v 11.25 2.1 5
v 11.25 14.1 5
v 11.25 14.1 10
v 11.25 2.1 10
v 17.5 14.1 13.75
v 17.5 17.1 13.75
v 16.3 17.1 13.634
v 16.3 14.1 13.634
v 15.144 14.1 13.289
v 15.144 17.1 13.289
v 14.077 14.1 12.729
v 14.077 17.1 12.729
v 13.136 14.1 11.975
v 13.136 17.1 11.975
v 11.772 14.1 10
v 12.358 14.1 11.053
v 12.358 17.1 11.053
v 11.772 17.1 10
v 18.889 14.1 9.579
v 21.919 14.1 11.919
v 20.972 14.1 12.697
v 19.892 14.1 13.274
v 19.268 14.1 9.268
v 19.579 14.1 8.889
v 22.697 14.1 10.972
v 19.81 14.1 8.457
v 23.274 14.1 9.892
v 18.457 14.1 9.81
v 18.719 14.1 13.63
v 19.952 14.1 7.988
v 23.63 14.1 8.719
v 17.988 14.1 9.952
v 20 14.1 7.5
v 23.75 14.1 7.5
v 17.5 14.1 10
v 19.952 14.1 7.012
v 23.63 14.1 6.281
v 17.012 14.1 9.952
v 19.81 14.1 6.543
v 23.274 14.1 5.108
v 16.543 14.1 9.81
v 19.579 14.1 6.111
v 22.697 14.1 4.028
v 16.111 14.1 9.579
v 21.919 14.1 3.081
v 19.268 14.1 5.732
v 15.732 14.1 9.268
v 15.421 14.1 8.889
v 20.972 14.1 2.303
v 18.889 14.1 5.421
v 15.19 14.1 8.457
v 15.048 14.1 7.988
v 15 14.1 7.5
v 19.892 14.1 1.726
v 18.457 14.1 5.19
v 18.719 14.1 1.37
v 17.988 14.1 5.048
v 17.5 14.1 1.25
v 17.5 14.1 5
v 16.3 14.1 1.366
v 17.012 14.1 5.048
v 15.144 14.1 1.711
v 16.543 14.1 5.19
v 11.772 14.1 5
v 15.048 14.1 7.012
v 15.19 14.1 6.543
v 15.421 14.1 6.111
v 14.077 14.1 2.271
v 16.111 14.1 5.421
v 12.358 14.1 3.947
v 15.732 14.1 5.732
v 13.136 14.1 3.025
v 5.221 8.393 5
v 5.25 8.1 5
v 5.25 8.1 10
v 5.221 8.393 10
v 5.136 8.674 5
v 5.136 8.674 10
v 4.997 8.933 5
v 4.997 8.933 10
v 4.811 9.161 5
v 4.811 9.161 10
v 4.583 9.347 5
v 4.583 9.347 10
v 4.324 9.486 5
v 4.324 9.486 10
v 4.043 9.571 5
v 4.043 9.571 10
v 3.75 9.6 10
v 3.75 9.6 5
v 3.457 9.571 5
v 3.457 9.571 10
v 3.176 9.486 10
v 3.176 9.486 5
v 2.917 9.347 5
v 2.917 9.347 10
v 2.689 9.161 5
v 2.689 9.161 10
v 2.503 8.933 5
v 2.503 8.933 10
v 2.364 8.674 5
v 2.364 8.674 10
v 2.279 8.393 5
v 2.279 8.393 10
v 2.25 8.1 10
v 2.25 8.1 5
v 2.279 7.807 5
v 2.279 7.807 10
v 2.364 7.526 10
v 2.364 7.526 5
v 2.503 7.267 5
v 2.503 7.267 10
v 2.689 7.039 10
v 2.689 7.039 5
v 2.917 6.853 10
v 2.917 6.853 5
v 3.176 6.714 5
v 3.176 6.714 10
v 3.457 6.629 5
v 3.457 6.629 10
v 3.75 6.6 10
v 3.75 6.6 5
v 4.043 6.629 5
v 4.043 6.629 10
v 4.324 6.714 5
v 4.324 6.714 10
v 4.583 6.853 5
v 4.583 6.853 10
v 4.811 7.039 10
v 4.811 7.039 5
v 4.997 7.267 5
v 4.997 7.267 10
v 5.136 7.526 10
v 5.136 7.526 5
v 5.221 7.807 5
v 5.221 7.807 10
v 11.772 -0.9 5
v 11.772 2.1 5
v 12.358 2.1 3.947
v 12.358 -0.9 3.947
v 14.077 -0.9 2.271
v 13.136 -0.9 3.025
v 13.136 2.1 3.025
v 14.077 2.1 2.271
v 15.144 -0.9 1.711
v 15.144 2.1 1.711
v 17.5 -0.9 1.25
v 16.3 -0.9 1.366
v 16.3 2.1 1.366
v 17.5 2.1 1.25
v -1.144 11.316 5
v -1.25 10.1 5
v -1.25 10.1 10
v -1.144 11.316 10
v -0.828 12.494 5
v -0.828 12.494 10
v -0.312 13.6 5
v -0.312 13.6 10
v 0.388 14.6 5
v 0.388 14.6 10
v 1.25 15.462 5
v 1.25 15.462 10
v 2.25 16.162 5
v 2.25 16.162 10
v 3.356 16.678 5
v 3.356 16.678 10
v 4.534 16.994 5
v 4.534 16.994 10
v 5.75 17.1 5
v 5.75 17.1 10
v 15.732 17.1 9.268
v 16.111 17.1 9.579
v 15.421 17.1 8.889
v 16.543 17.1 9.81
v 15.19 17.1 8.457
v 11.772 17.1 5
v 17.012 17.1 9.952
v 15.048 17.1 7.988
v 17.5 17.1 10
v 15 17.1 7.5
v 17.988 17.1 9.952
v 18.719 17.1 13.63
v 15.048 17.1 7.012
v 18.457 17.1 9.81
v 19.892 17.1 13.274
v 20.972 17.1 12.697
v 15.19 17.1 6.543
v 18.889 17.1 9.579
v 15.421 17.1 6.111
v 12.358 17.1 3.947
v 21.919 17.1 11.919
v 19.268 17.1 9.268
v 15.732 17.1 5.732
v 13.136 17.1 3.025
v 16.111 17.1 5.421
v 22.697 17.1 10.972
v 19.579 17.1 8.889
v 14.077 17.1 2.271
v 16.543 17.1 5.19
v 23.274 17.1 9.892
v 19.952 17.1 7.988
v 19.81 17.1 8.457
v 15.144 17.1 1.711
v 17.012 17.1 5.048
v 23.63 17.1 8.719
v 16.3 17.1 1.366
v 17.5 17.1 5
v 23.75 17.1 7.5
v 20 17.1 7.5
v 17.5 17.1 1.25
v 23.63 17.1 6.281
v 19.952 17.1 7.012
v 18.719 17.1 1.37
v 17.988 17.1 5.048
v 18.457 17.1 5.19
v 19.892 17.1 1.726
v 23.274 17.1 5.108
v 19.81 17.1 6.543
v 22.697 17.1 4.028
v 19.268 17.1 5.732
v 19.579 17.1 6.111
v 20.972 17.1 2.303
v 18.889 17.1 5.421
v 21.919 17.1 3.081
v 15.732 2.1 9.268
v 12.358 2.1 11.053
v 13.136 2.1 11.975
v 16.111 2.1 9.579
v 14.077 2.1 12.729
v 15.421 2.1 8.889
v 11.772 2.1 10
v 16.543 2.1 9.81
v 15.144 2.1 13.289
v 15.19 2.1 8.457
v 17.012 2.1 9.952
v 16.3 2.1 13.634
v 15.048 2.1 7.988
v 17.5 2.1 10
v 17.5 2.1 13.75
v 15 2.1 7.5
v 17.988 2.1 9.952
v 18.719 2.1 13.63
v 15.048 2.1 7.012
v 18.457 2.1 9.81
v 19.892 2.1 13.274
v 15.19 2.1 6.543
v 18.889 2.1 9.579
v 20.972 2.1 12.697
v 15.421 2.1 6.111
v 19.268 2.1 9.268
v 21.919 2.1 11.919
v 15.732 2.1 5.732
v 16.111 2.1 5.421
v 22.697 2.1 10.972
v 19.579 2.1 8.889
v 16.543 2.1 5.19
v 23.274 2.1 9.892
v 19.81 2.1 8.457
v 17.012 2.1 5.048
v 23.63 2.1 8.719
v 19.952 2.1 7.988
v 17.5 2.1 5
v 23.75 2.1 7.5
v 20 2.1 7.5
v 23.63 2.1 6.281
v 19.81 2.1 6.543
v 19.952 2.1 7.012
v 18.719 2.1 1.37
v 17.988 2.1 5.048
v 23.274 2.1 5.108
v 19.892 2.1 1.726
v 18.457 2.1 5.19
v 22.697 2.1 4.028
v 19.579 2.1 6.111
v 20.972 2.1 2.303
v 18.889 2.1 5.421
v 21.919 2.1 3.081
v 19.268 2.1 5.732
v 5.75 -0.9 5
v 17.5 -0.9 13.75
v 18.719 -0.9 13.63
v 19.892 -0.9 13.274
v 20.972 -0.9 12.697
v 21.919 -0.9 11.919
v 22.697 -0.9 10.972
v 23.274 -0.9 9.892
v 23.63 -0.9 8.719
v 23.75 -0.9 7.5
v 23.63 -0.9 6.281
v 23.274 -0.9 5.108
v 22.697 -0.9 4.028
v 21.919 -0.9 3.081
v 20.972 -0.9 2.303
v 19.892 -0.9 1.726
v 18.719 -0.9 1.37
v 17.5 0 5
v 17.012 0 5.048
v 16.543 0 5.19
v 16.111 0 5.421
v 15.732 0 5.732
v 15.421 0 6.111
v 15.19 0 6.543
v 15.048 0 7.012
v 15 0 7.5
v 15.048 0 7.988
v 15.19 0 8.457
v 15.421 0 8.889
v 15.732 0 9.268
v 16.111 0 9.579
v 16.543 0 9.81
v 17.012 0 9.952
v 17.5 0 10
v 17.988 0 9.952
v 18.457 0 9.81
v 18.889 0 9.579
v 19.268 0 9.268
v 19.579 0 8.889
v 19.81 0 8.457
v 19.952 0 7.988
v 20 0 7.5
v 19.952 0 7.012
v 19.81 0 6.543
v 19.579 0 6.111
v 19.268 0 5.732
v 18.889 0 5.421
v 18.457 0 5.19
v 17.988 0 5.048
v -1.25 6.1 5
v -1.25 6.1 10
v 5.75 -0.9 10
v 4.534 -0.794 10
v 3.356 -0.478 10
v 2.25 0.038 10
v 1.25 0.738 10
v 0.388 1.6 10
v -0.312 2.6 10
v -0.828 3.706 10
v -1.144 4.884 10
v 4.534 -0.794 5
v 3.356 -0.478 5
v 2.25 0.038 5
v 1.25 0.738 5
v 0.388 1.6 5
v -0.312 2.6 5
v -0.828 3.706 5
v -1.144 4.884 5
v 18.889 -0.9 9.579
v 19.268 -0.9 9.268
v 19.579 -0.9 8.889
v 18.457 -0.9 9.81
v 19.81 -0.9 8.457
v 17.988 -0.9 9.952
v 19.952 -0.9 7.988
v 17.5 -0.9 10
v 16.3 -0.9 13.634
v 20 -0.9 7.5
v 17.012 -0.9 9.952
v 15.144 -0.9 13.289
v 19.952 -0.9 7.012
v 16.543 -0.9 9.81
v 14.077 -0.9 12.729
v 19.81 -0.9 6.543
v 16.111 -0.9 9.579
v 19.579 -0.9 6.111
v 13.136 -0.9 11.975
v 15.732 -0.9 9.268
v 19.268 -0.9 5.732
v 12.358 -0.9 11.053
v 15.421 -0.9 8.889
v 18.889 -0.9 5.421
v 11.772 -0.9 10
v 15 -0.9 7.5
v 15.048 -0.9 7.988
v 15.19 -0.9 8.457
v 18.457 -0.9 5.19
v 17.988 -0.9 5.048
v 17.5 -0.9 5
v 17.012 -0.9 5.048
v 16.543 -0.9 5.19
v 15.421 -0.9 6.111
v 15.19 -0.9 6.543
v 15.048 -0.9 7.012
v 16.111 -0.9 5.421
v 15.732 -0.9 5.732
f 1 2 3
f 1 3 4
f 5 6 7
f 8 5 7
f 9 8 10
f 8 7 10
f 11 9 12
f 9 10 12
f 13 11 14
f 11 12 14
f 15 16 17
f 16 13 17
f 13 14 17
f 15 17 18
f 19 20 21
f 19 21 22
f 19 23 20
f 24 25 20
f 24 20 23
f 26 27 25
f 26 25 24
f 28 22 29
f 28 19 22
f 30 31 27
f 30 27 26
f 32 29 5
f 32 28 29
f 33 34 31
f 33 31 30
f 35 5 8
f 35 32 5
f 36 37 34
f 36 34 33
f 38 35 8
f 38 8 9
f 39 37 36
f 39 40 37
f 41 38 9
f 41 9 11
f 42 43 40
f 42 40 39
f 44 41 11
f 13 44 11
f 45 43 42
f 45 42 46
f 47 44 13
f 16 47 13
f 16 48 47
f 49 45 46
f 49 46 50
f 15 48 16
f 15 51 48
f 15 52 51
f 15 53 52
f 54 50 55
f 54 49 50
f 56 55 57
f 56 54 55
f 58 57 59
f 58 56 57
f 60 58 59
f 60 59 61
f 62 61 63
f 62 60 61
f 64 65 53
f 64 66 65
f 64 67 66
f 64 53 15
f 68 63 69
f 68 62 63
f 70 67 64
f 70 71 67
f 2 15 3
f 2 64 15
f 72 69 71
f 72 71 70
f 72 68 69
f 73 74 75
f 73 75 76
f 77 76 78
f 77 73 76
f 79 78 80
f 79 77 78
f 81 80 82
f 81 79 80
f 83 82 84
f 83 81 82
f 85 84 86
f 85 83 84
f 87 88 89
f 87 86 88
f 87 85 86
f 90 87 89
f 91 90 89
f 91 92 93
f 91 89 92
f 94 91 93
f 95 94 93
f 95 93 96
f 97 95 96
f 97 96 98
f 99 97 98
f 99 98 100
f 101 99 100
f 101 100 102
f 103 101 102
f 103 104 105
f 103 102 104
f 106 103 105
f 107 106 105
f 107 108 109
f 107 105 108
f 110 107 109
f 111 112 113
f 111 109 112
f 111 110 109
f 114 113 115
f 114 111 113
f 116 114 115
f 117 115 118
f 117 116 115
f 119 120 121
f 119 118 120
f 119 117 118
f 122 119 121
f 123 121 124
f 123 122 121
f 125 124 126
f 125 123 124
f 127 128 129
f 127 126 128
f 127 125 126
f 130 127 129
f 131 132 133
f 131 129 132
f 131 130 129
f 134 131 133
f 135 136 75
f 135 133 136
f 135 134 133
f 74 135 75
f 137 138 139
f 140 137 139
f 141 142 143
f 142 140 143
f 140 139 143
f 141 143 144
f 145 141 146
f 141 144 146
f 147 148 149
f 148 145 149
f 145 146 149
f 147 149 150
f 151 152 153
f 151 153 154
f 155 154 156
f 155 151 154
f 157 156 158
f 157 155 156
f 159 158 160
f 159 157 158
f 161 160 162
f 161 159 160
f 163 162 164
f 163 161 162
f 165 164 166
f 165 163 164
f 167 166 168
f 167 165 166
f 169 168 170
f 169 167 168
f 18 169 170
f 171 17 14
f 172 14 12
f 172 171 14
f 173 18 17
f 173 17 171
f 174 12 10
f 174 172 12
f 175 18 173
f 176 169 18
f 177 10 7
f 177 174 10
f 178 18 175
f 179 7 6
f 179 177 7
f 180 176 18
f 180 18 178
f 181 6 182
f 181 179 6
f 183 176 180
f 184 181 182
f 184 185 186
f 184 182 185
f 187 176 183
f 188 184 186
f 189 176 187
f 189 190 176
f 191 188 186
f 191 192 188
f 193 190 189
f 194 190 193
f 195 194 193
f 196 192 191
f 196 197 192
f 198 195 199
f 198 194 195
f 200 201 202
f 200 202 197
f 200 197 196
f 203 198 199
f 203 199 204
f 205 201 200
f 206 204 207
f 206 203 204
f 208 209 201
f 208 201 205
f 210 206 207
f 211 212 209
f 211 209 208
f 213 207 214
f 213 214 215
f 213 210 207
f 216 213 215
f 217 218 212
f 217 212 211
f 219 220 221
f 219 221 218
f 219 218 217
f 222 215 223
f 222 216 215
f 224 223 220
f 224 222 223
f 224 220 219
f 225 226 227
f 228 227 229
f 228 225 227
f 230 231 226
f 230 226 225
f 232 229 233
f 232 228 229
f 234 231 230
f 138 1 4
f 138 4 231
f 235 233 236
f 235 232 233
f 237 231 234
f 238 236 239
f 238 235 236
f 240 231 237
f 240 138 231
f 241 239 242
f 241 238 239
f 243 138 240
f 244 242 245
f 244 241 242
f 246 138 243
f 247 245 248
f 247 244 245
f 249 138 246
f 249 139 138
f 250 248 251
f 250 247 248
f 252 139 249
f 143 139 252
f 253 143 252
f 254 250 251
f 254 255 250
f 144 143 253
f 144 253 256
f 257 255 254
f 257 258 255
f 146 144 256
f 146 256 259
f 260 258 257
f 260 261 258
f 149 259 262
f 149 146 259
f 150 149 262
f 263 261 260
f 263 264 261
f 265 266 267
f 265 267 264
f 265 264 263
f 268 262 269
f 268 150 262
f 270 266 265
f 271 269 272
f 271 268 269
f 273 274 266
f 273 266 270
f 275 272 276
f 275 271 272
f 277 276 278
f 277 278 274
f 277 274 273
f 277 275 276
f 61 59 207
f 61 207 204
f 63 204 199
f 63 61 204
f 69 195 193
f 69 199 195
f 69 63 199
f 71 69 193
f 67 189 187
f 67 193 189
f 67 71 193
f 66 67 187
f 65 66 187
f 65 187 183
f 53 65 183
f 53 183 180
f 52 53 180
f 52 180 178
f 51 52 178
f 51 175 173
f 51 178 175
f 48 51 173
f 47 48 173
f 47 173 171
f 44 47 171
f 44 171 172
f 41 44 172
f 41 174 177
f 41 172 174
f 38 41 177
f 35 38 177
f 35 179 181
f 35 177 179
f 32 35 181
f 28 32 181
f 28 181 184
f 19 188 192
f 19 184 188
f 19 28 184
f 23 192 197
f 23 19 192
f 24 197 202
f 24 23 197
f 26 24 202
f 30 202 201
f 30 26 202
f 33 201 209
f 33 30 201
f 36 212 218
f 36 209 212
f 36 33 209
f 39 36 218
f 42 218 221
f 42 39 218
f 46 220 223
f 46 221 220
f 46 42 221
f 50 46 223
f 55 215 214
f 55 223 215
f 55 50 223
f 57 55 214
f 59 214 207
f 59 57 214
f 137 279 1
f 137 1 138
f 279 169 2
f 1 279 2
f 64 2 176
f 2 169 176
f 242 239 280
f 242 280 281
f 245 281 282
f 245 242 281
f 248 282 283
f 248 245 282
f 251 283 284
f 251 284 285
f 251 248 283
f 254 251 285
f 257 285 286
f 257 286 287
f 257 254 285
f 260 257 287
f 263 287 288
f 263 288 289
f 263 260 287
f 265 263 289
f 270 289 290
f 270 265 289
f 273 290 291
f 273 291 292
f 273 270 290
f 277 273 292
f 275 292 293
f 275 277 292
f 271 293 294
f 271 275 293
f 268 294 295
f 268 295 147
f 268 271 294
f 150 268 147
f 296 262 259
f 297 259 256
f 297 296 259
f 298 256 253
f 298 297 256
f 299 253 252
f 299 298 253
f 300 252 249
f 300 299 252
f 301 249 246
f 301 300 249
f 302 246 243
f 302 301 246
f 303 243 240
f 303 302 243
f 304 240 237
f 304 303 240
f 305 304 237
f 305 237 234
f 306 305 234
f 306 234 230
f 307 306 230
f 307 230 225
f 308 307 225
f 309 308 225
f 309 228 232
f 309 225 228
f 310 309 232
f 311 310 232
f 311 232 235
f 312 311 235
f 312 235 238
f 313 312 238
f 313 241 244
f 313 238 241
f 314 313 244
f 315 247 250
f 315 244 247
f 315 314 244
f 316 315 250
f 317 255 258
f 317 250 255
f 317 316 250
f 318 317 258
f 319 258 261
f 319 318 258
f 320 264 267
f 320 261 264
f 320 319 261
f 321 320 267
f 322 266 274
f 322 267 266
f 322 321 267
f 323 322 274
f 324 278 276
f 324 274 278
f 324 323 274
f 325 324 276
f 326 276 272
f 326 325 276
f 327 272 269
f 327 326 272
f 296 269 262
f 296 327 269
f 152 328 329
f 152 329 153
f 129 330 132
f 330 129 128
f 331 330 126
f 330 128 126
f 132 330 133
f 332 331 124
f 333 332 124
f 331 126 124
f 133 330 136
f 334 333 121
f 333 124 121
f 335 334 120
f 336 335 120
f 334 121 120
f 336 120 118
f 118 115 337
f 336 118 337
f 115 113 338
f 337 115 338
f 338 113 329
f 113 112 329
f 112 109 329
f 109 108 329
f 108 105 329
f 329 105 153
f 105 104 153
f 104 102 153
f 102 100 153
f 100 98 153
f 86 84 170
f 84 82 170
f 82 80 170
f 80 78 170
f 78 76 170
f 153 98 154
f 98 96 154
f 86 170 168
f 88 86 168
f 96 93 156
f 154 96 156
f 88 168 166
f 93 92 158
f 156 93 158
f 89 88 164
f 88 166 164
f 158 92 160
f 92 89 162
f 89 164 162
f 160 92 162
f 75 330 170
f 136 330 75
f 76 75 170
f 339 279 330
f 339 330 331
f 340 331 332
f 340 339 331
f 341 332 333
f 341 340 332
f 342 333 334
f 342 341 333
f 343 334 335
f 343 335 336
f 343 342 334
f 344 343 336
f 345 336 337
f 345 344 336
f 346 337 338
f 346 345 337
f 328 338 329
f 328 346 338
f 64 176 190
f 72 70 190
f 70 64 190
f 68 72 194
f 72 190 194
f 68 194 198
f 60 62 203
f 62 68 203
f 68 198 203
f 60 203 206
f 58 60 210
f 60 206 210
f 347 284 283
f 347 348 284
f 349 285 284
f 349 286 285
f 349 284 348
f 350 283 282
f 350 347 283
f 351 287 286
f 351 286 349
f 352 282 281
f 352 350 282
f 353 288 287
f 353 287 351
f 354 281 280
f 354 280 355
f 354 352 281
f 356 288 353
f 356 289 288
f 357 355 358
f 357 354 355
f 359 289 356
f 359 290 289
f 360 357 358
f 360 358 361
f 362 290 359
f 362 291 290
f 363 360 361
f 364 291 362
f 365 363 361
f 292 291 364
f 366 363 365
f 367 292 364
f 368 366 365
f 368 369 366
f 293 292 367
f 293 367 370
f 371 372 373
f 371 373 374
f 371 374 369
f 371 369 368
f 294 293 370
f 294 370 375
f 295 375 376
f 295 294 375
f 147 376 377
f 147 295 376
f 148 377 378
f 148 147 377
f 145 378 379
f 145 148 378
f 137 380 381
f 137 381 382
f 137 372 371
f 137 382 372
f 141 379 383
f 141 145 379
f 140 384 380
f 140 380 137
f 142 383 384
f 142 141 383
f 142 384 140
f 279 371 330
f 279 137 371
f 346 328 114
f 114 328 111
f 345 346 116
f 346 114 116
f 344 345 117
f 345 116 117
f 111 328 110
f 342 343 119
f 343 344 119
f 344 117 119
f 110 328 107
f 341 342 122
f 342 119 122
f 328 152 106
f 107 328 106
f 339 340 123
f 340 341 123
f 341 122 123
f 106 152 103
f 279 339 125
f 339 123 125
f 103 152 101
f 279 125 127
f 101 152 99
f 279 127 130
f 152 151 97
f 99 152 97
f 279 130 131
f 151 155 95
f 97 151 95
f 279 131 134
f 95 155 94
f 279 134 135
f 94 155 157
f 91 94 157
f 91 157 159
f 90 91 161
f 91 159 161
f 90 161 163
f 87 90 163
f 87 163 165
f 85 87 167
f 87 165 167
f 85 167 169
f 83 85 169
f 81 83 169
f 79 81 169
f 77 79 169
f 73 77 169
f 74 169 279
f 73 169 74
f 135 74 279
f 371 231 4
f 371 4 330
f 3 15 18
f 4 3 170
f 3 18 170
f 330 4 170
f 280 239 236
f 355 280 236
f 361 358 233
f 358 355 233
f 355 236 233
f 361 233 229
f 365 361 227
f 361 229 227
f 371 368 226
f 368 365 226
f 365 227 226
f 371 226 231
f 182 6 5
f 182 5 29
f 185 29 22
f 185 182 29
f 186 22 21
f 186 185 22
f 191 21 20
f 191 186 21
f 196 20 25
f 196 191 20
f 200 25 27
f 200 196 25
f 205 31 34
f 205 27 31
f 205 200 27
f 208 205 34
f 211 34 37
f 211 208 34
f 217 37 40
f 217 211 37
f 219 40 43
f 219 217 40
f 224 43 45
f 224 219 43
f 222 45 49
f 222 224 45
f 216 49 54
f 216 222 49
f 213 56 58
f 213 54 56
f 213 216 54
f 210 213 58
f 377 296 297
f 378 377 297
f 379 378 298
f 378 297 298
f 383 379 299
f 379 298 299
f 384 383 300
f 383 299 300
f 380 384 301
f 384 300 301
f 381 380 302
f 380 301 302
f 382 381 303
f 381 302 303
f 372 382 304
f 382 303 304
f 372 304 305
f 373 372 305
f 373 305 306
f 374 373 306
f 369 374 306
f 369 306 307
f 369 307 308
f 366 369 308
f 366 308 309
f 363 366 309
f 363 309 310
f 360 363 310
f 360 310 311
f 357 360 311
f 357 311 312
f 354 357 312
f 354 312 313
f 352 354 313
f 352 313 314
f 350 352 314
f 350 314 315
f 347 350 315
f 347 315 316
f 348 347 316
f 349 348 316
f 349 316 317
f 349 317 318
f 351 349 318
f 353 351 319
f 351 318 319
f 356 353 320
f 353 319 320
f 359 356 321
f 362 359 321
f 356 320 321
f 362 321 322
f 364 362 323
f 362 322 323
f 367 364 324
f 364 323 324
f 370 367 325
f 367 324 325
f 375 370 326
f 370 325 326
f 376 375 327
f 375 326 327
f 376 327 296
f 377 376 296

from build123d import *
from build123d.topology import SkipClean

# Parameters (mm, degrees)
CROQUIS1_R              = 1.5
SALIENTE_EXTRUIR1_DEPTH = 15
CROQUIS2_R              = 2.5
CORTAR_EXTRUIR1_DEPTH   = 20
CORTAR_EXTRUIR2_DEPTH   = 22


with BuildPart() as part:
    # Croquis1 → Saliente-Extruir1 (new body)
    with BuildSketch(Plane.XY):
        with BuildLine():
            Line((11.25, 14.1), (11.25, 11.1))
            Line((11.25, 11.1), (11.25, 5.1))
            Line((11.25, 5.1), (11.25, 2.1))
            Line((11.25, 2.1), (23.75, 2.1))
            Line((23.75, 2.1), (23.75, -0.9))
            Line((23.75, -0.9), (11.25, -0.9))
            Line((11.25, -0.9), (5.75, -0.9))
            ThreePointArc((5.75, -0.9), (0.800252532, 1.150252532), (-1.25, 6.1))
            Line((-1.25, 6.1), (-1.25, 10.1))
            ThreePointArc((-1.25, 10.1), (0.800252532, 15.049747468), (5.75, 17.1))
            Line((5.75, 17.1), (11.25, 17.1))
            Line((11.25, 17.1), (23.75, 17.1))
            Line((23.75, 17.1), (23.75, 14.1))
            Line((23.75, 14.1), (11.25, 14.1))
        make_face()
        with Locations((3.75, 8.1)):
            Circle(CROQUIS1_R, mode=Mode.SUBTRACT)
    extrude(amount=SALIENTE_EXTRUIR1_DEPTH)

    # Croquis2 → Cortar-Extruir1 (cut, symmetric)
    with BuildSketch(Plane(origin=(0, 0, 0), x_dir=(1, 0, 0), z_dir=(0, 1, 0))):
        with Locations(Location((17.5, -7.5, 0), (0, 0, 90))):
            Circle(CROQUIS2_R)
        with BuildLine():
            Line((17.5, -1.25), (11.25, 0))
            Line((11.25, 0), (11.126279301, 1.868603497))
            Line((11.126279301, 1.868603497), (29.663453957, 1.868603497))
            Line((29.663453957, 1.868603497), (29.663453957, -17.961269996))
            Line((29.663453957, -17.961269996), (11.25, -17.961269996))
            Line((11.25, -17.961269996), (11.25, -15))
            Line((11.25, -15), (17.5, -13.75))
            ThreePointArc((17.5, -13.75), (23.75, -7.5), (17.5, -1.25))
        make_face()
    extrude(amount=CORTAR_EXTRUIR1_DEPTH, both=True, mode=Mode.SUBTRACT)

    # Croquis3 → Cortar-Extruir2 (cut)
    with SkipClean():  # the faces are left unmerged after this step: merging them gives an invalid solid
        with BuildSketch(Plane(origin=(0, 17.1, 0), x_dir=(1, 0, 0), z_dir=(0, 1, 0))):
            Polygon((5.75, -10), (-2.050741432, -10), (-2.325121179, -18.2596058), (20.840368904, -18.2596058), (17.5, -13.75), (11.25, -15), (5.75, -15), align=None)
            with BuildLine():
                Line((11.771780381, -10), (5.75, -10))
                Line((5.75, -10), (5.75, -15))
                Line((5.75, -15), (11.25, -15))
                Line((11.25, -15), (17.5, -13.75))
                ThreePointArc((17.5, -13.75), (14.076734016, -12.729125166), (11.771780381, -10))
            make_face()
            with BuildLine():
                Line((5.75, 0), (5.75, -5))
                Line((5.75, -5), (11.771780381, -5))
                ThreePointArc((11.771780381, -5), (14.076734016, -2.270874834), (17.5, -1.25))
                Line((17.5, -1.25), (11.25, 0))
                Line((11.25, 0), (5.75, 0))
            make_face()
            Polygon((-2.050741432, -5), (5.75, -5), (5.75, 0), (11.25, 0), (17.5, -1.25), (17.5, 1.613327317), (-2.050741432, 1.613327317), align=None)
        extrude(amount=-CORTAR_EXTRUIR2_DEPTH, mode=Mode.SUBTRACT)


solid = part.part
